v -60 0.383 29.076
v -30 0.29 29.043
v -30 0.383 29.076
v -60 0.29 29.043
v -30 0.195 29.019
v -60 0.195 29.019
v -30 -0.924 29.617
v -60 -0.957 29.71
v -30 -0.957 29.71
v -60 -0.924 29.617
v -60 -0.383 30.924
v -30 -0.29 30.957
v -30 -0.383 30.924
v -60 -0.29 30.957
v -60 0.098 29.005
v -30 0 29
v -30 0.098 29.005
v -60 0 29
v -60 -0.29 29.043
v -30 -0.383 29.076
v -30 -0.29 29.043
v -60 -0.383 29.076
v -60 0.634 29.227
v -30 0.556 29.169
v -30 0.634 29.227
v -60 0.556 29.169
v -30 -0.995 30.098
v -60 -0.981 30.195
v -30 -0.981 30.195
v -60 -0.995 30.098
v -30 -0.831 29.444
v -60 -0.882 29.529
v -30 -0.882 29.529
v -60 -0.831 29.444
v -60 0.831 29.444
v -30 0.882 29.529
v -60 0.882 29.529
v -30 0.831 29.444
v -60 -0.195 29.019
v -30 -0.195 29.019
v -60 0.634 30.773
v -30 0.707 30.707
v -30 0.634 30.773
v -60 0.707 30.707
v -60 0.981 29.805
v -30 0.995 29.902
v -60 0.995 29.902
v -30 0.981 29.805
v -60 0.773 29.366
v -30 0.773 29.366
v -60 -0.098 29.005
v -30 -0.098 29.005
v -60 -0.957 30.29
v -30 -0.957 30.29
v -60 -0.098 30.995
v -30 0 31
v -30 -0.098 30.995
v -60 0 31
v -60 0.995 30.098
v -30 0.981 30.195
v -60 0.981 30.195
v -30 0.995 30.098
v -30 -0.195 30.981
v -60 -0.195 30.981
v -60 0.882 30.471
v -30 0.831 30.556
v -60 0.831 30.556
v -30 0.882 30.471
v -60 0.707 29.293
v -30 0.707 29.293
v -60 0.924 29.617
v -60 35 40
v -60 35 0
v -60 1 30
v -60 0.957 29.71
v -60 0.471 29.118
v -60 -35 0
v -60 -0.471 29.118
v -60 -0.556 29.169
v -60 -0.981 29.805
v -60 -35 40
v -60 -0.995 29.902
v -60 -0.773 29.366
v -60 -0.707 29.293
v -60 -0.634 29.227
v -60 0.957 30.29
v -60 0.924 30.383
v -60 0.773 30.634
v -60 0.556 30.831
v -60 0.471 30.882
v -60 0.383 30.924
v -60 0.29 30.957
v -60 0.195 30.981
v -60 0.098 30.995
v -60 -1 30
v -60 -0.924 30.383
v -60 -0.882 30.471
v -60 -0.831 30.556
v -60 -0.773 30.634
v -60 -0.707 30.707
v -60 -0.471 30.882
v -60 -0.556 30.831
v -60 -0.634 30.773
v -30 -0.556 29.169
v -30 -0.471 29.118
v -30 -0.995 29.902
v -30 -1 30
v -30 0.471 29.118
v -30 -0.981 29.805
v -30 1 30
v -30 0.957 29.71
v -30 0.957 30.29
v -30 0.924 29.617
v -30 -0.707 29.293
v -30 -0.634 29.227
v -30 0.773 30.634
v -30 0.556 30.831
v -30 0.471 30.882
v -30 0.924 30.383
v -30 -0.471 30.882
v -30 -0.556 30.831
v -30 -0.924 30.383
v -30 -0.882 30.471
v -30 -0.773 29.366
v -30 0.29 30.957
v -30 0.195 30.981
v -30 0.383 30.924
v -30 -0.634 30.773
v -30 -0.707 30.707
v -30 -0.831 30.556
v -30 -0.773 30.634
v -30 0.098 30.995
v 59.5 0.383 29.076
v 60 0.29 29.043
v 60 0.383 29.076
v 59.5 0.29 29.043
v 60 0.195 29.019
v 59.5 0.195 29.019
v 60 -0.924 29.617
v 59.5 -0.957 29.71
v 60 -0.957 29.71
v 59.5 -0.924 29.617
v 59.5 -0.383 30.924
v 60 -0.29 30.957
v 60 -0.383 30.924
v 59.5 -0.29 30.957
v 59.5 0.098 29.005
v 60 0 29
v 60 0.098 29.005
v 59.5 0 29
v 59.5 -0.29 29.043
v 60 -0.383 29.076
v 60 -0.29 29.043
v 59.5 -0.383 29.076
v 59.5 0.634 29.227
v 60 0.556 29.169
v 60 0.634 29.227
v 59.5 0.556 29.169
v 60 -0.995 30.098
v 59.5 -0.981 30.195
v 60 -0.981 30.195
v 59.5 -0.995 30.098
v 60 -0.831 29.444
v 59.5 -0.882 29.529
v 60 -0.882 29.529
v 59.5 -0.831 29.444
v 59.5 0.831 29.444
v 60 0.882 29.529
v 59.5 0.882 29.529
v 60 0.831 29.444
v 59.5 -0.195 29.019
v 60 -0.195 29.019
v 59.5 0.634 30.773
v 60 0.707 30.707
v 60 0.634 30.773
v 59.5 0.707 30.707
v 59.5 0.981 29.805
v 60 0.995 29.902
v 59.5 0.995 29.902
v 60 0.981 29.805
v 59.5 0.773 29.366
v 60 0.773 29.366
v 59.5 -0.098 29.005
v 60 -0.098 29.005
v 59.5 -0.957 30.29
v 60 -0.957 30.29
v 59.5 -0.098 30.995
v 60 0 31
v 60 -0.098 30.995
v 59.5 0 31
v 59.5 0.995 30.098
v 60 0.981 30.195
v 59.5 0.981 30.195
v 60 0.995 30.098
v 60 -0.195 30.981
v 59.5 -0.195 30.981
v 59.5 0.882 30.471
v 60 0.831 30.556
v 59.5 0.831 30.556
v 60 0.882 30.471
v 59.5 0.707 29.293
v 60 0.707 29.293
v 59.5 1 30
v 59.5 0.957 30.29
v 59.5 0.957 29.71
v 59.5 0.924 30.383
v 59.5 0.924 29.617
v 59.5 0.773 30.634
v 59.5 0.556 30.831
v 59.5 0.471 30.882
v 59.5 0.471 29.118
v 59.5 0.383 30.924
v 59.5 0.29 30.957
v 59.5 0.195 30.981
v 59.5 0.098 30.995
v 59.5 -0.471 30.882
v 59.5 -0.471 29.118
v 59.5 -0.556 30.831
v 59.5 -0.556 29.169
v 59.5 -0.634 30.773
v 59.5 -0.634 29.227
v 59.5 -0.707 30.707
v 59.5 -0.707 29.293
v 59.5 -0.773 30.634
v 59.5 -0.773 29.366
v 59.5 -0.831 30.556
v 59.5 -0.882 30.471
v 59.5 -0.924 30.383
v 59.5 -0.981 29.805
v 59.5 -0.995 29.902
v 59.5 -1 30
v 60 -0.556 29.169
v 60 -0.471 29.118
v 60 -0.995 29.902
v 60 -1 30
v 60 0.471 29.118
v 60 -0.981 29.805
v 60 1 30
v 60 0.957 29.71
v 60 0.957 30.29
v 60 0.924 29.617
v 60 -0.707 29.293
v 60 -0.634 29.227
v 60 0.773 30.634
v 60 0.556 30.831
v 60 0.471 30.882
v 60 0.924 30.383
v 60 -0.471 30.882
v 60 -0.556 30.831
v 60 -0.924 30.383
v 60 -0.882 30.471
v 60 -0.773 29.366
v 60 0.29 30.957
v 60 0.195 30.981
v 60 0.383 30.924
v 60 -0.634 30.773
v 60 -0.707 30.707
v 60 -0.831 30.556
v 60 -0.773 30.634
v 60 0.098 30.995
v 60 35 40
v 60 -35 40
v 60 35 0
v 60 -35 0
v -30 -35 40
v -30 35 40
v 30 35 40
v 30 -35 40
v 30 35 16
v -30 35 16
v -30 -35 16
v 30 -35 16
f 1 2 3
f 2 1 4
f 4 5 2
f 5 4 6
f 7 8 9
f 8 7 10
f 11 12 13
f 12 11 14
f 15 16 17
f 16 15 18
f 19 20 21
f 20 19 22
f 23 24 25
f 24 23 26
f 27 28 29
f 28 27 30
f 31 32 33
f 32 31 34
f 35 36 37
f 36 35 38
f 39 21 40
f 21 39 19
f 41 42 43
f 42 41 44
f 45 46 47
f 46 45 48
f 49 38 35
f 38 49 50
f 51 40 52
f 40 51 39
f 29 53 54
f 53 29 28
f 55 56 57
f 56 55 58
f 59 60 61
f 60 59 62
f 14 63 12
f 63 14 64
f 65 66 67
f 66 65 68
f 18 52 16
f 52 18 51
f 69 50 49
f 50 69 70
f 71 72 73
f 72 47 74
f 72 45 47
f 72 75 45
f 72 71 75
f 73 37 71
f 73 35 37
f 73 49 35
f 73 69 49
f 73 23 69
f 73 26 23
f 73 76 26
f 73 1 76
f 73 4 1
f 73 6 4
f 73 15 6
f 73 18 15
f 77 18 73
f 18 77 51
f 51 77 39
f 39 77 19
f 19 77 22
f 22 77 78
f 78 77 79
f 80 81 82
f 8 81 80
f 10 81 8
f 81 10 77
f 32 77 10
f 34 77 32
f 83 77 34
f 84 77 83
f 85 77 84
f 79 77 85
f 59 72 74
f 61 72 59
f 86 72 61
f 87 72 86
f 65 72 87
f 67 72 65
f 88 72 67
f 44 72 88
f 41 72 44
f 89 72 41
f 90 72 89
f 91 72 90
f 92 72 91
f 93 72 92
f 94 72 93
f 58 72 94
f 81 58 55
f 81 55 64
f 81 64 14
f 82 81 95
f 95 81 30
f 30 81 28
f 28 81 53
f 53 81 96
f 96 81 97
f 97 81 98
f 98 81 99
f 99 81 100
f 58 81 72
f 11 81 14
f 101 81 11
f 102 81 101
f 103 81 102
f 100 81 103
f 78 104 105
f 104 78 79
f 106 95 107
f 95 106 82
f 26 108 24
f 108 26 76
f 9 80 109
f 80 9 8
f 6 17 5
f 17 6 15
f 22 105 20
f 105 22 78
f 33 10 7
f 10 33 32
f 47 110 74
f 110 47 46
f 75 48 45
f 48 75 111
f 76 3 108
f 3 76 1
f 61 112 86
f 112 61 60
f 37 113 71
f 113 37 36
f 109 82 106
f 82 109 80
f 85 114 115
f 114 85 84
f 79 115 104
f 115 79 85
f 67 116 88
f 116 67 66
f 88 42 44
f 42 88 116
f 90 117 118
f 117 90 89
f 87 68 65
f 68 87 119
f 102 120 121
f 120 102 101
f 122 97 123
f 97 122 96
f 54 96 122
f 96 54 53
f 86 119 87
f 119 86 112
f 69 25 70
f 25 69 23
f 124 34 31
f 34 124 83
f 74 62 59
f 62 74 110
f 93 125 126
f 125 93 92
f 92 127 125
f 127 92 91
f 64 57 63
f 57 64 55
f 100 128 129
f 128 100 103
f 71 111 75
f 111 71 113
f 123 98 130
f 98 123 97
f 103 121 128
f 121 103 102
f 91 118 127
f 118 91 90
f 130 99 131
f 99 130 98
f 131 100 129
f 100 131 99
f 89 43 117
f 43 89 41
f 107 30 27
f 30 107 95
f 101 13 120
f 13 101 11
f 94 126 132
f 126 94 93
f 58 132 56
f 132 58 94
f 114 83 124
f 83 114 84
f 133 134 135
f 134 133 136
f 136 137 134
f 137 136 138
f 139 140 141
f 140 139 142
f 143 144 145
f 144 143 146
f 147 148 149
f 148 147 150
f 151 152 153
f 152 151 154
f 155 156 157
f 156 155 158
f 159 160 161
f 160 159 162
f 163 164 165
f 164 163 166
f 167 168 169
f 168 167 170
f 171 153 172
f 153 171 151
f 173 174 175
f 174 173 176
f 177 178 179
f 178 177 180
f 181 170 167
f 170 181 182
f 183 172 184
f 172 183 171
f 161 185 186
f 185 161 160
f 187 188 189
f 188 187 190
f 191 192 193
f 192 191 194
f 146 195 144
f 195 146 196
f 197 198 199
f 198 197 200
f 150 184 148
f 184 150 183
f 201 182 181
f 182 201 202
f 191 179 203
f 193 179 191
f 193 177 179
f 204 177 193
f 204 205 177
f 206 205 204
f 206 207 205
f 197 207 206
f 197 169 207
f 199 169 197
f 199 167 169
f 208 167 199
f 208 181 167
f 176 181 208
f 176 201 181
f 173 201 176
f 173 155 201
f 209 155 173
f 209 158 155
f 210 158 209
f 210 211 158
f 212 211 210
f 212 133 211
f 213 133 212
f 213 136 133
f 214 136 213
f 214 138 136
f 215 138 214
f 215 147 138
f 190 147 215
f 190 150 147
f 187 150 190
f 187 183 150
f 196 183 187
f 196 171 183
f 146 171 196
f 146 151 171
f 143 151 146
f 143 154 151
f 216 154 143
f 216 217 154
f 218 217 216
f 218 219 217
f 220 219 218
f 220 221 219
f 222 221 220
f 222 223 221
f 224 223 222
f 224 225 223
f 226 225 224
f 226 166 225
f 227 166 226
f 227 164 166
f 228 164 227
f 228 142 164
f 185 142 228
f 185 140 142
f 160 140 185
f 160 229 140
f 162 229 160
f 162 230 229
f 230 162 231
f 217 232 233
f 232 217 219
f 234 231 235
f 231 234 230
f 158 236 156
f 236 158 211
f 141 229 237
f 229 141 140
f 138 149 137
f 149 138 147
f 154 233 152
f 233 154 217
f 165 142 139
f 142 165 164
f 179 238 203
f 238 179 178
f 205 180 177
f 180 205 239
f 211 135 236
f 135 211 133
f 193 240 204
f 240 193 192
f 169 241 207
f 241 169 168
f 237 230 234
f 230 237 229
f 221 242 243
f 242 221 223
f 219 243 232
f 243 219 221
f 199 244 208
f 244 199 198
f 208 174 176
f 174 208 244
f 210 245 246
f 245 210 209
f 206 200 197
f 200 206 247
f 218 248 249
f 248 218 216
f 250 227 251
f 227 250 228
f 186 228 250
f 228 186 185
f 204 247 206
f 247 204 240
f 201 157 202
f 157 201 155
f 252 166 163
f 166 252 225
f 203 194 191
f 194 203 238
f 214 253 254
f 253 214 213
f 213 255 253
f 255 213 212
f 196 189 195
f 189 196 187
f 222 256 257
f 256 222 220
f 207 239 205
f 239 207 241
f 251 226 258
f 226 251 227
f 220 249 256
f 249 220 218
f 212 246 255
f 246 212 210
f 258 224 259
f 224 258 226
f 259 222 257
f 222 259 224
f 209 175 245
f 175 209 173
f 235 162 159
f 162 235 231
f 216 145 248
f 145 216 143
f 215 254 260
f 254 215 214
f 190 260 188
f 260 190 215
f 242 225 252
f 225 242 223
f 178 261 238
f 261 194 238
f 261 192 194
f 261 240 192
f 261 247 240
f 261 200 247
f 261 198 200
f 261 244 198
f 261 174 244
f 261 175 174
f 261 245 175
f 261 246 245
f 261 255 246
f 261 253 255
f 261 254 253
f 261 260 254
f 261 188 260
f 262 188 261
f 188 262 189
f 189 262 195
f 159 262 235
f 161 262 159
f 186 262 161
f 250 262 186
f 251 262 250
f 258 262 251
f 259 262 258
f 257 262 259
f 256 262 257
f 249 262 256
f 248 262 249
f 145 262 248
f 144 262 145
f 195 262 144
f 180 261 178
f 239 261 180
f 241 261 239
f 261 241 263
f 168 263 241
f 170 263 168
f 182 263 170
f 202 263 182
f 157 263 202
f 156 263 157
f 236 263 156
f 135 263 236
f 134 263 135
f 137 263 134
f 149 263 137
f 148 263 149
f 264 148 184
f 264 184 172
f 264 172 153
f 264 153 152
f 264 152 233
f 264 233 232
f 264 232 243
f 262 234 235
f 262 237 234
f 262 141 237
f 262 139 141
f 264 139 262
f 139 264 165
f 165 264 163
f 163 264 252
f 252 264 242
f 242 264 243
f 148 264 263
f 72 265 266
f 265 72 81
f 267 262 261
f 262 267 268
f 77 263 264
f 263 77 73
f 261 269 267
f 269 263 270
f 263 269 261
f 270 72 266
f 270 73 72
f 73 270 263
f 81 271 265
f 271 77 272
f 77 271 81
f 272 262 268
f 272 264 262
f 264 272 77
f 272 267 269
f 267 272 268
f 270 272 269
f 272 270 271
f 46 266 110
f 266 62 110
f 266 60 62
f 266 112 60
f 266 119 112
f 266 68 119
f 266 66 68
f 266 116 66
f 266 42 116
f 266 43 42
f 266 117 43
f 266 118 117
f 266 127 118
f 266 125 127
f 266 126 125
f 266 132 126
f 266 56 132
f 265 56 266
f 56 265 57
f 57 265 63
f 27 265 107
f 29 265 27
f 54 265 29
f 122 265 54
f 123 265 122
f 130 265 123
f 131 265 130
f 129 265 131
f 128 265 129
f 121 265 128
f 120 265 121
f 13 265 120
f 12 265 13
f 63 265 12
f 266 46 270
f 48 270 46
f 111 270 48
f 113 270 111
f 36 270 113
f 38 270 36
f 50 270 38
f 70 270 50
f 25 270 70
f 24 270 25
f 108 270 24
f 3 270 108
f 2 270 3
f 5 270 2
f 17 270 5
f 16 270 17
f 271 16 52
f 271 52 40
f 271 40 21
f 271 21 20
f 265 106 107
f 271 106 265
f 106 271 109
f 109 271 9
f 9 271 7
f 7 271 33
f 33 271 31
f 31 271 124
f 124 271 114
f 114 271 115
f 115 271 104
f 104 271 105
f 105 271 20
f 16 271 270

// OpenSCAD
// Mini horizontal gel-electrophoresis buffer tank
// Print orientation: base on XY plane, open top, builds up +Z

$fn = 64;

// ---- Tank dimensions ----
outer_x = 120;   // outer length in X
outer_y = 70;    // outer width in Y
height  = 40;    // overall height in Z
wall    = 3;     // wall thickness
floor   = 3;     // floor thickness

// ---- Platform dimensions ----
plat_len   = 60;  // platform length in X (centred)
plat_top_z = 13;  // platform top height above inner floor

// ---- Electrode holes ----
hole_d = 2;       // hole diameter
hole_y = 0;       // hole Y position
hole_z = 30;      // hole Z position

// ---- Derived ----
inner_h = height - floor;              // inner floor to open top
cut_ext = 0.5;                         // overshoot for clean cuts

difference() {
    // Main tank body (solid through walls and floor)
    translate([-outer_x/2, -outer_y/2, 0])
        cube([outer_x, outer_y, height]);

    // Gel-tray platform, raised above inner floor
    translate([-plat_len/2, -outer_y/2, floor + plat_top_z])
        cube([plat_len, outer_y, inner_h]);

    // Horizontal electrode holes through each end wall
    for (sx = [-1, 1])
        translate([sx > 0 ? outer_x/2 - cut_ext : -outer_x/2, hole_y, hole_z])
            rotate([0, 90, 0])
                cylinder(d = hole_d, h = outer_y + 2*cut_ext);
}
